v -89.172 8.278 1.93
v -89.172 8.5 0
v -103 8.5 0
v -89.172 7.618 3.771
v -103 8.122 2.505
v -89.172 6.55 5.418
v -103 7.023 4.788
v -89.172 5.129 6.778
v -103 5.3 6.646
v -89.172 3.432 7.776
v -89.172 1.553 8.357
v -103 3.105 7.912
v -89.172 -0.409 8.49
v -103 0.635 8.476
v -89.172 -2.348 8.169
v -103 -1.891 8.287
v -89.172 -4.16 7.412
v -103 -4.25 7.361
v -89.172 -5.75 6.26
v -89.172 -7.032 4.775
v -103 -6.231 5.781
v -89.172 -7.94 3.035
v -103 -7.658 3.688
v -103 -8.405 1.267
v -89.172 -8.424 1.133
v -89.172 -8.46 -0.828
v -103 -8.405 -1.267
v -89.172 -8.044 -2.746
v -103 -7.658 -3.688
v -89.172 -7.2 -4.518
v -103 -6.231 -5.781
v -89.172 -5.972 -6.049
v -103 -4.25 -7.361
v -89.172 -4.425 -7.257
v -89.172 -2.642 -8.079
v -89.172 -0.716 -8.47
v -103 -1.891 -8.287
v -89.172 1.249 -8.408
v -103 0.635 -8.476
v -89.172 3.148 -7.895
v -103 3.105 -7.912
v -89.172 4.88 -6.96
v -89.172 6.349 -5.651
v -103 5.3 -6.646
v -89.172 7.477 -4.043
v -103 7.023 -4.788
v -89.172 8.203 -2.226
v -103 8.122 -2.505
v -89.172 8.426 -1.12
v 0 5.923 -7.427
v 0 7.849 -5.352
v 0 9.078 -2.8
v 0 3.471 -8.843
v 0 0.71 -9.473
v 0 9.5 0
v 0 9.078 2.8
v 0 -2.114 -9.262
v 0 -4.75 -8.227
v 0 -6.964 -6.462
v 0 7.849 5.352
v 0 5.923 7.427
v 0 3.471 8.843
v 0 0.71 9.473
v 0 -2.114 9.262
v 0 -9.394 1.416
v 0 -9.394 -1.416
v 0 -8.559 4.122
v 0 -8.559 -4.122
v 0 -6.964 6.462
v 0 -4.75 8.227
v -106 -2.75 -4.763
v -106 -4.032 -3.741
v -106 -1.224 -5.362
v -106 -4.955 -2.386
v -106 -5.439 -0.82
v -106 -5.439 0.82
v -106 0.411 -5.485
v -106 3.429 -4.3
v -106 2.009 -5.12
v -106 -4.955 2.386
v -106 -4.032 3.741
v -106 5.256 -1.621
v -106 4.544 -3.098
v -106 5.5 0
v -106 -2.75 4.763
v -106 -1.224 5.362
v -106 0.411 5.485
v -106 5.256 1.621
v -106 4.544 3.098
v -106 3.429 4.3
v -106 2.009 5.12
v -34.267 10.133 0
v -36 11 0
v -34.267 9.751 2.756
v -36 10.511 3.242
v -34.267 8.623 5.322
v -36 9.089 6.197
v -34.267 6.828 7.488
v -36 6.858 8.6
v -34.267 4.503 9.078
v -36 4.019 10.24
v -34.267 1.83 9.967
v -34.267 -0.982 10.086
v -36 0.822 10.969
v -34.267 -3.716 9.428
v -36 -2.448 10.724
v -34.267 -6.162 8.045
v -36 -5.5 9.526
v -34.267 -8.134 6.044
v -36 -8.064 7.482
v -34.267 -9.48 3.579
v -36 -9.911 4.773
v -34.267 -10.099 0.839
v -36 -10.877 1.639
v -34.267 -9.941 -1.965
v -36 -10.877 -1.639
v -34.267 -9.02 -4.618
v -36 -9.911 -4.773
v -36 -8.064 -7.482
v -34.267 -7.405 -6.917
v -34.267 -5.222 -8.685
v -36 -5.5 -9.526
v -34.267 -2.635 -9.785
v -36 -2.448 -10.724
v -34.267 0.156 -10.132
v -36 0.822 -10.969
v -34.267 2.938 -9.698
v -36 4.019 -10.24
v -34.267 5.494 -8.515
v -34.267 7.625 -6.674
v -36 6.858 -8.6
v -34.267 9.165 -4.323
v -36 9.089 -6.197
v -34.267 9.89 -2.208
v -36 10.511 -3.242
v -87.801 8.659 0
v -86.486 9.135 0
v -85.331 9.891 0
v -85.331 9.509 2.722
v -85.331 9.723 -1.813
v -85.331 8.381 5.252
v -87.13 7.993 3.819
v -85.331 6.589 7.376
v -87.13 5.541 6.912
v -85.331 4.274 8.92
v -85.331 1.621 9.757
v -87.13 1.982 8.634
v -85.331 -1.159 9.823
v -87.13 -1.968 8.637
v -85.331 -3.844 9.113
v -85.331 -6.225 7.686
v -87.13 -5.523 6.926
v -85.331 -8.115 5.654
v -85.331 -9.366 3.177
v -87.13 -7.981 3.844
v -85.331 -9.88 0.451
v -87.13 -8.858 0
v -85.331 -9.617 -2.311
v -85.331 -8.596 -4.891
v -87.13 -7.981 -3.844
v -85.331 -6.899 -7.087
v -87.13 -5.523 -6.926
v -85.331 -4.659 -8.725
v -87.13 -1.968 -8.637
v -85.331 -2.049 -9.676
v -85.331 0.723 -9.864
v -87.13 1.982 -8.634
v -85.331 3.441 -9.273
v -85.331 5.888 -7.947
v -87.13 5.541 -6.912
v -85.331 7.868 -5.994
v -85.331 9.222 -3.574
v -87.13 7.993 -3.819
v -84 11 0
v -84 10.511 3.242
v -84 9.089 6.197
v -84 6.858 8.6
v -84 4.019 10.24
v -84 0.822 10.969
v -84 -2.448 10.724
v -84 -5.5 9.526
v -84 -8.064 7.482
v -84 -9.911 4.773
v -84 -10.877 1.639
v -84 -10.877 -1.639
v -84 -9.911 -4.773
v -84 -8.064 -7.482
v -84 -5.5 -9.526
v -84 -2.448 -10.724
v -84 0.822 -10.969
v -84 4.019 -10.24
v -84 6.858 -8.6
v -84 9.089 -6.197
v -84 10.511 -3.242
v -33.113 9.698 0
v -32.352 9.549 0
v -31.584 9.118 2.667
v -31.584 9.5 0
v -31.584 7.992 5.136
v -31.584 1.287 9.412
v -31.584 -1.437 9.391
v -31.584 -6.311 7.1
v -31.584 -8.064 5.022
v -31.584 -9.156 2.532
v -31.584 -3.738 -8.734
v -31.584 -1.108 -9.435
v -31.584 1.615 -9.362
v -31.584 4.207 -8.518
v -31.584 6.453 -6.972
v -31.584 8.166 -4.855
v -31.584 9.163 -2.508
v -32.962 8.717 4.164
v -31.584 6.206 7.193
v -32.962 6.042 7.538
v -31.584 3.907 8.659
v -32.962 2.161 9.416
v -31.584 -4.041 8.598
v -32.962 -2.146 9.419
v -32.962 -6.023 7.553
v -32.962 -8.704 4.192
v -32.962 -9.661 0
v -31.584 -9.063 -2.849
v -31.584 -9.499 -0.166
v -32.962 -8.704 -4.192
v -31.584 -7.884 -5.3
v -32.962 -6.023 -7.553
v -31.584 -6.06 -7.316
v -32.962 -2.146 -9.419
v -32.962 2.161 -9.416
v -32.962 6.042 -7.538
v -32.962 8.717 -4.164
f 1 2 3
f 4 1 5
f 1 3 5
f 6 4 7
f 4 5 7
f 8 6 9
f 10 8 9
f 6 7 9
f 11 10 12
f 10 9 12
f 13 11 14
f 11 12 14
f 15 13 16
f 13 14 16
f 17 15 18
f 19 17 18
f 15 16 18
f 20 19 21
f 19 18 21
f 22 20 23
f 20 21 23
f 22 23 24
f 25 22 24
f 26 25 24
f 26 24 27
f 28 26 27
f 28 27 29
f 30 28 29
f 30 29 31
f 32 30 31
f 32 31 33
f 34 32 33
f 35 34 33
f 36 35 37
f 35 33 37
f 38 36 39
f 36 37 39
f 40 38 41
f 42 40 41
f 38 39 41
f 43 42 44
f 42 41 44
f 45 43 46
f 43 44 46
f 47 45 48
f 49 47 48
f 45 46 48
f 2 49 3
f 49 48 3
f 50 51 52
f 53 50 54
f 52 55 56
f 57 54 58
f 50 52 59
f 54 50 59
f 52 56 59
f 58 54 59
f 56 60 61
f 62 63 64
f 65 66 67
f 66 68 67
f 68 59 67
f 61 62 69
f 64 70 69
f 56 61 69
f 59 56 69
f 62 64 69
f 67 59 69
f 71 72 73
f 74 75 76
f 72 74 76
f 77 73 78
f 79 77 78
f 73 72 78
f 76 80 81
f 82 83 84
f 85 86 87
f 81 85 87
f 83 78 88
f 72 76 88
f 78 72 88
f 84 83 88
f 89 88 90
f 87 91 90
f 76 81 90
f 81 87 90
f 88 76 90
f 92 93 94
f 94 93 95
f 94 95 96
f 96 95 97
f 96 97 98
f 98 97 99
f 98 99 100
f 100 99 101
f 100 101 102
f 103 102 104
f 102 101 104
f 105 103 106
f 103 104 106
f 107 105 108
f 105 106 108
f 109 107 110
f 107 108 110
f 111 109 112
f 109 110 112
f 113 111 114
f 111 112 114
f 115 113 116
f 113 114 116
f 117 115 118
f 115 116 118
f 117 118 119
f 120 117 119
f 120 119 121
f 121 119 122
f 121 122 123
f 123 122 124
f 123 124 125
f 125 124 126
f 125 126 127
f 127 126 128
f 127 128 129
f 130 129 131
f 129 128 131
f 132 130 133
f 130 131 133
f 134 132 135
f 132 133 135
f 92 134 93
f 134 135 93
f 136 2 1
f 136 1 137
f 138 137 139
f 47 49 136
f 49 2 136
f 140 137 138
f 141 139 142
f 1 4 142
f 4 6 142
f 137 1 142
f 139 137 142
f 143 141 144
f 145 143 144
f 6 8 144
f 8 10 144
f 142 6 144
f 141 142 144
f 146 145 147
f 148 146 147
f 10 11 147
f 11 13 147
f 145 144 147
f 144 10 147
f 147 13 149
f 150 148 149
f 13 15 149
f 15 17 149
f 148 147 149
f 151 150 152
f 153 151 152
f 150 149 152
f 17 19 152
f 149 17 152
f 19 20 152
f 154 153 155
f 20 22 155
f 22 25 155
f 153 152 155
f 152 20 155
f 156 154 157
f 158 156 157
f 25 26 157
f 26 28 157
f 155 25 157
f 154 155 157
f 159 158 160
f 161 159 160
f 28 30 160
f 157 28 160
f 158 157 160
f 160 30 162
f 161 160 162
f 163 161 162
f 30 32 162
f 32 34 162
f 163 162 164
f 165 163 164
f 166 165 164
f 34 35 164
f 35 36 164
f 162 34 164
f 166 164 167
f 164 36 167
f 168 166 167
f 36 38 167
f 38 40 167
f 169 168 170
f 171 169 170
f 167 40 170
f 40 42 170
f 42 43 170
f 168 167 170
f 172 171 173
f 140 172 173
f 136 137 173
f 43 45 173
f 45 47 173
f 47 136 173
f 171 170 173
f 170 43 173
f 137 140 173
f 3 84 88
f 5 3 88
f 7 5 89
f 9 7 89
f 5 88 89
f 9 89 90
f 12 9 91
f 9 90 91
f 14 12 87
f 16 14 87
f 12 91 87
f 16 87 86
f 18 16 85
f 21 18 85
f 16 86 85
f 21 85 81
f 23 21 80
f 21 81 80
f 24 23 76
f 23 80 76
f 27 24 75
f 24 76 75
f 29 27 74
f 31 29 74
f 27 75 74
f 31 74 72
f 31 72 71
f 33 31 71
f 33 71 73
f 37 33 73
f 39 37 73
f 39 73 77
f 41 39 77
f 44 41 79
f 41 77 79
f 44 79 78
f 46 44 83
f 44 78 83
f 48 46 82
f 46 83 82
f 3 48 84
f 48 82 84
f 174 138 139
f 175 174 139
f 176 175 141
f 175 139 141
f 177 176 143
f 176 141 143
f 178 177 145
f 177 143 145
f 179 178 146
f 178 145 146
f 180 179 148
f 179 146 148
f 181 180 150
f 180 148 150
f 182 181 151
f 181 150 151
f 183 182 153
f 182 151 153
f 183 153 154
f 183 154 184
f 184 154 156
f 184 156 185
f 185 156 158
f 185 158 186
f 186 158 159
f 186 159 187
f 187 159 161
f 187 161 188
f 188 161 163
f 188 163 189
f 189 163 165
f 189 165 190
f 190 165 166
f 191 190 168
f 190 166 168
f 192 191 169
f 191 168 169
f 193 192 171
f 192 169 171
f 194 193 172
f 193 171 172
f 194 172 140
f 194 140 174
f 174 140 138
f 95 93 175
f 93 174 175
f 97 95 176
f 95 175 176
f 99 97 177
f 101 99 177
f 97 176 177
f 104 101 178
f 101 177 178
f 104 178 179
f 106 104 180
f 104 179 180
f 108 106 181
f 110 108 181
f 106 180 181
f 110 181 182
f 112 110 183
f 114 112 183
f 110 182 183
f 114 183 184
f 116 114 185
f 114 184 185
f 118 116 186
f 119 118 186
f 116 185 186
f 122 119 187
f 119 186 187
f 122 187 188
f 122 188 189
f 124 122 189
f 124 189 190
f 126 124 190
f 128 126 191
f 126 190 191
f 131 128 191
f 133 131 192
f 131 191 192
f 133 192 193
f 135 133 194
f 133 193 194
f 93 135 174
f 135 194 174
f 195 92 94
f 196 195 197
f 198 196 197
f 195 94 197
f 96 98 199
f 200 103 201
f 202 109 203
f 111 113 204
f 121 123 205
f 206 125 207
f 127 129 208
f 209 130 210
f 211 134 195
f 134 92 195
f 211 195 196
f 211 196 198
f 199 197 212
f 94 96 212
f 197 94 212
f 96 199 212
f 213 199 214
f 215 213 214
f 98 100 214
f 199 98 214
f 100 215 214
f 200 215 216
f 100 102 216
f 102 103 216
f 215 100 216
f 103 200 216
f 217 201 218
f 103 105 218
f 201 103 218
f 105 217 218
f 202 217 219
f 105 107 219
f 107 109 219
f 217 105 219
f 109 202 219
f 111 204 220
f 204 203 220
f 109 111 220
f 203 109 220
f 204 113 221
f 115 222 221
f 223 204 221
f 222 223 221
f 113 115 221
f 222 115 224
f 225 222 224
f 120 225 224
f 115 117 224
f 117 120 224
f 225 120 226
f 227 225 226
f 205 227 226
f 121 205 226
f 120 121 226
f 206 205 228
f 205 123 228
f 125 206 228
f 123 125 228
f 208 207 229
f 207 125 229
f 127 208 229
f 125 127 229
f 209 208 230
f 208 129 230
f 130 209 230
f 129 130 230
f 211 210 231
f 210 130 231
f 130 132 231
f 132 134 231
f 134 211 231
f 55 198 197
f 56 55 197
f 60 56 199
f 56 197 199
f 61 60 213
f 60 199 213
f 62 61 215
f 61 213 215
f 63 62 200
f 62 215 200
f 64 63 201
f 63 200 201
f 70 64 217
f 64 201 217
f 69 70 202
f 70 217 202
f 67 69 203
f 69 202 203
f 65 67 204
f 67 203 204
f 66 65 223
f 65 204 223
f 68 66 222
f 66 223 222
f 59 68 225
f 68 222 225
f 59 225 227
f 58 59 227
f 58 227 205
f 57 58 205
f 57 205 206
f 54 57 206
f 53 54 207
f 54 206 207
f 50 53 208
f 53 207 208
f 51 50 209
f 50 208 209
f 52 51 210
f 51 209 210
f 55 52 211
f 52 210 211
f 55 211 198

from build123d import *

# Parameters (mm, degrees)
F2_SIZE = 3
F3_R    = 6


with BuildPart() as f1:
    # F0 (on Top) → F1 (revolve)
    with BuildSketch(Plane.XY):
        Polygon((-106, 0), (0, 0), (0, 9.5), (-33, 9.5), (-36, 11), (-84, 11), (-87, 8.5), (-106, 8.5), align=None)
    revolve(axis=Axis((-53, 0, 0), (1, 0, 0)))

    # F2
    f2_edges = [f1.edges().sort_by_distance(p)[0] for p in [
        (-106, -8.5, 0),
    ]]
    chamfer(f2_edges, length=F2_SIZE)

    # F3
    f3_edges = [f1.edges().sort_by_distance(p)[0] for p in [
        (-87, -8.5, 0),
        (-33, -9.5, 0),
    ]]
    fillet(f3_edges, radius=F3_R)


solid = f1.part
